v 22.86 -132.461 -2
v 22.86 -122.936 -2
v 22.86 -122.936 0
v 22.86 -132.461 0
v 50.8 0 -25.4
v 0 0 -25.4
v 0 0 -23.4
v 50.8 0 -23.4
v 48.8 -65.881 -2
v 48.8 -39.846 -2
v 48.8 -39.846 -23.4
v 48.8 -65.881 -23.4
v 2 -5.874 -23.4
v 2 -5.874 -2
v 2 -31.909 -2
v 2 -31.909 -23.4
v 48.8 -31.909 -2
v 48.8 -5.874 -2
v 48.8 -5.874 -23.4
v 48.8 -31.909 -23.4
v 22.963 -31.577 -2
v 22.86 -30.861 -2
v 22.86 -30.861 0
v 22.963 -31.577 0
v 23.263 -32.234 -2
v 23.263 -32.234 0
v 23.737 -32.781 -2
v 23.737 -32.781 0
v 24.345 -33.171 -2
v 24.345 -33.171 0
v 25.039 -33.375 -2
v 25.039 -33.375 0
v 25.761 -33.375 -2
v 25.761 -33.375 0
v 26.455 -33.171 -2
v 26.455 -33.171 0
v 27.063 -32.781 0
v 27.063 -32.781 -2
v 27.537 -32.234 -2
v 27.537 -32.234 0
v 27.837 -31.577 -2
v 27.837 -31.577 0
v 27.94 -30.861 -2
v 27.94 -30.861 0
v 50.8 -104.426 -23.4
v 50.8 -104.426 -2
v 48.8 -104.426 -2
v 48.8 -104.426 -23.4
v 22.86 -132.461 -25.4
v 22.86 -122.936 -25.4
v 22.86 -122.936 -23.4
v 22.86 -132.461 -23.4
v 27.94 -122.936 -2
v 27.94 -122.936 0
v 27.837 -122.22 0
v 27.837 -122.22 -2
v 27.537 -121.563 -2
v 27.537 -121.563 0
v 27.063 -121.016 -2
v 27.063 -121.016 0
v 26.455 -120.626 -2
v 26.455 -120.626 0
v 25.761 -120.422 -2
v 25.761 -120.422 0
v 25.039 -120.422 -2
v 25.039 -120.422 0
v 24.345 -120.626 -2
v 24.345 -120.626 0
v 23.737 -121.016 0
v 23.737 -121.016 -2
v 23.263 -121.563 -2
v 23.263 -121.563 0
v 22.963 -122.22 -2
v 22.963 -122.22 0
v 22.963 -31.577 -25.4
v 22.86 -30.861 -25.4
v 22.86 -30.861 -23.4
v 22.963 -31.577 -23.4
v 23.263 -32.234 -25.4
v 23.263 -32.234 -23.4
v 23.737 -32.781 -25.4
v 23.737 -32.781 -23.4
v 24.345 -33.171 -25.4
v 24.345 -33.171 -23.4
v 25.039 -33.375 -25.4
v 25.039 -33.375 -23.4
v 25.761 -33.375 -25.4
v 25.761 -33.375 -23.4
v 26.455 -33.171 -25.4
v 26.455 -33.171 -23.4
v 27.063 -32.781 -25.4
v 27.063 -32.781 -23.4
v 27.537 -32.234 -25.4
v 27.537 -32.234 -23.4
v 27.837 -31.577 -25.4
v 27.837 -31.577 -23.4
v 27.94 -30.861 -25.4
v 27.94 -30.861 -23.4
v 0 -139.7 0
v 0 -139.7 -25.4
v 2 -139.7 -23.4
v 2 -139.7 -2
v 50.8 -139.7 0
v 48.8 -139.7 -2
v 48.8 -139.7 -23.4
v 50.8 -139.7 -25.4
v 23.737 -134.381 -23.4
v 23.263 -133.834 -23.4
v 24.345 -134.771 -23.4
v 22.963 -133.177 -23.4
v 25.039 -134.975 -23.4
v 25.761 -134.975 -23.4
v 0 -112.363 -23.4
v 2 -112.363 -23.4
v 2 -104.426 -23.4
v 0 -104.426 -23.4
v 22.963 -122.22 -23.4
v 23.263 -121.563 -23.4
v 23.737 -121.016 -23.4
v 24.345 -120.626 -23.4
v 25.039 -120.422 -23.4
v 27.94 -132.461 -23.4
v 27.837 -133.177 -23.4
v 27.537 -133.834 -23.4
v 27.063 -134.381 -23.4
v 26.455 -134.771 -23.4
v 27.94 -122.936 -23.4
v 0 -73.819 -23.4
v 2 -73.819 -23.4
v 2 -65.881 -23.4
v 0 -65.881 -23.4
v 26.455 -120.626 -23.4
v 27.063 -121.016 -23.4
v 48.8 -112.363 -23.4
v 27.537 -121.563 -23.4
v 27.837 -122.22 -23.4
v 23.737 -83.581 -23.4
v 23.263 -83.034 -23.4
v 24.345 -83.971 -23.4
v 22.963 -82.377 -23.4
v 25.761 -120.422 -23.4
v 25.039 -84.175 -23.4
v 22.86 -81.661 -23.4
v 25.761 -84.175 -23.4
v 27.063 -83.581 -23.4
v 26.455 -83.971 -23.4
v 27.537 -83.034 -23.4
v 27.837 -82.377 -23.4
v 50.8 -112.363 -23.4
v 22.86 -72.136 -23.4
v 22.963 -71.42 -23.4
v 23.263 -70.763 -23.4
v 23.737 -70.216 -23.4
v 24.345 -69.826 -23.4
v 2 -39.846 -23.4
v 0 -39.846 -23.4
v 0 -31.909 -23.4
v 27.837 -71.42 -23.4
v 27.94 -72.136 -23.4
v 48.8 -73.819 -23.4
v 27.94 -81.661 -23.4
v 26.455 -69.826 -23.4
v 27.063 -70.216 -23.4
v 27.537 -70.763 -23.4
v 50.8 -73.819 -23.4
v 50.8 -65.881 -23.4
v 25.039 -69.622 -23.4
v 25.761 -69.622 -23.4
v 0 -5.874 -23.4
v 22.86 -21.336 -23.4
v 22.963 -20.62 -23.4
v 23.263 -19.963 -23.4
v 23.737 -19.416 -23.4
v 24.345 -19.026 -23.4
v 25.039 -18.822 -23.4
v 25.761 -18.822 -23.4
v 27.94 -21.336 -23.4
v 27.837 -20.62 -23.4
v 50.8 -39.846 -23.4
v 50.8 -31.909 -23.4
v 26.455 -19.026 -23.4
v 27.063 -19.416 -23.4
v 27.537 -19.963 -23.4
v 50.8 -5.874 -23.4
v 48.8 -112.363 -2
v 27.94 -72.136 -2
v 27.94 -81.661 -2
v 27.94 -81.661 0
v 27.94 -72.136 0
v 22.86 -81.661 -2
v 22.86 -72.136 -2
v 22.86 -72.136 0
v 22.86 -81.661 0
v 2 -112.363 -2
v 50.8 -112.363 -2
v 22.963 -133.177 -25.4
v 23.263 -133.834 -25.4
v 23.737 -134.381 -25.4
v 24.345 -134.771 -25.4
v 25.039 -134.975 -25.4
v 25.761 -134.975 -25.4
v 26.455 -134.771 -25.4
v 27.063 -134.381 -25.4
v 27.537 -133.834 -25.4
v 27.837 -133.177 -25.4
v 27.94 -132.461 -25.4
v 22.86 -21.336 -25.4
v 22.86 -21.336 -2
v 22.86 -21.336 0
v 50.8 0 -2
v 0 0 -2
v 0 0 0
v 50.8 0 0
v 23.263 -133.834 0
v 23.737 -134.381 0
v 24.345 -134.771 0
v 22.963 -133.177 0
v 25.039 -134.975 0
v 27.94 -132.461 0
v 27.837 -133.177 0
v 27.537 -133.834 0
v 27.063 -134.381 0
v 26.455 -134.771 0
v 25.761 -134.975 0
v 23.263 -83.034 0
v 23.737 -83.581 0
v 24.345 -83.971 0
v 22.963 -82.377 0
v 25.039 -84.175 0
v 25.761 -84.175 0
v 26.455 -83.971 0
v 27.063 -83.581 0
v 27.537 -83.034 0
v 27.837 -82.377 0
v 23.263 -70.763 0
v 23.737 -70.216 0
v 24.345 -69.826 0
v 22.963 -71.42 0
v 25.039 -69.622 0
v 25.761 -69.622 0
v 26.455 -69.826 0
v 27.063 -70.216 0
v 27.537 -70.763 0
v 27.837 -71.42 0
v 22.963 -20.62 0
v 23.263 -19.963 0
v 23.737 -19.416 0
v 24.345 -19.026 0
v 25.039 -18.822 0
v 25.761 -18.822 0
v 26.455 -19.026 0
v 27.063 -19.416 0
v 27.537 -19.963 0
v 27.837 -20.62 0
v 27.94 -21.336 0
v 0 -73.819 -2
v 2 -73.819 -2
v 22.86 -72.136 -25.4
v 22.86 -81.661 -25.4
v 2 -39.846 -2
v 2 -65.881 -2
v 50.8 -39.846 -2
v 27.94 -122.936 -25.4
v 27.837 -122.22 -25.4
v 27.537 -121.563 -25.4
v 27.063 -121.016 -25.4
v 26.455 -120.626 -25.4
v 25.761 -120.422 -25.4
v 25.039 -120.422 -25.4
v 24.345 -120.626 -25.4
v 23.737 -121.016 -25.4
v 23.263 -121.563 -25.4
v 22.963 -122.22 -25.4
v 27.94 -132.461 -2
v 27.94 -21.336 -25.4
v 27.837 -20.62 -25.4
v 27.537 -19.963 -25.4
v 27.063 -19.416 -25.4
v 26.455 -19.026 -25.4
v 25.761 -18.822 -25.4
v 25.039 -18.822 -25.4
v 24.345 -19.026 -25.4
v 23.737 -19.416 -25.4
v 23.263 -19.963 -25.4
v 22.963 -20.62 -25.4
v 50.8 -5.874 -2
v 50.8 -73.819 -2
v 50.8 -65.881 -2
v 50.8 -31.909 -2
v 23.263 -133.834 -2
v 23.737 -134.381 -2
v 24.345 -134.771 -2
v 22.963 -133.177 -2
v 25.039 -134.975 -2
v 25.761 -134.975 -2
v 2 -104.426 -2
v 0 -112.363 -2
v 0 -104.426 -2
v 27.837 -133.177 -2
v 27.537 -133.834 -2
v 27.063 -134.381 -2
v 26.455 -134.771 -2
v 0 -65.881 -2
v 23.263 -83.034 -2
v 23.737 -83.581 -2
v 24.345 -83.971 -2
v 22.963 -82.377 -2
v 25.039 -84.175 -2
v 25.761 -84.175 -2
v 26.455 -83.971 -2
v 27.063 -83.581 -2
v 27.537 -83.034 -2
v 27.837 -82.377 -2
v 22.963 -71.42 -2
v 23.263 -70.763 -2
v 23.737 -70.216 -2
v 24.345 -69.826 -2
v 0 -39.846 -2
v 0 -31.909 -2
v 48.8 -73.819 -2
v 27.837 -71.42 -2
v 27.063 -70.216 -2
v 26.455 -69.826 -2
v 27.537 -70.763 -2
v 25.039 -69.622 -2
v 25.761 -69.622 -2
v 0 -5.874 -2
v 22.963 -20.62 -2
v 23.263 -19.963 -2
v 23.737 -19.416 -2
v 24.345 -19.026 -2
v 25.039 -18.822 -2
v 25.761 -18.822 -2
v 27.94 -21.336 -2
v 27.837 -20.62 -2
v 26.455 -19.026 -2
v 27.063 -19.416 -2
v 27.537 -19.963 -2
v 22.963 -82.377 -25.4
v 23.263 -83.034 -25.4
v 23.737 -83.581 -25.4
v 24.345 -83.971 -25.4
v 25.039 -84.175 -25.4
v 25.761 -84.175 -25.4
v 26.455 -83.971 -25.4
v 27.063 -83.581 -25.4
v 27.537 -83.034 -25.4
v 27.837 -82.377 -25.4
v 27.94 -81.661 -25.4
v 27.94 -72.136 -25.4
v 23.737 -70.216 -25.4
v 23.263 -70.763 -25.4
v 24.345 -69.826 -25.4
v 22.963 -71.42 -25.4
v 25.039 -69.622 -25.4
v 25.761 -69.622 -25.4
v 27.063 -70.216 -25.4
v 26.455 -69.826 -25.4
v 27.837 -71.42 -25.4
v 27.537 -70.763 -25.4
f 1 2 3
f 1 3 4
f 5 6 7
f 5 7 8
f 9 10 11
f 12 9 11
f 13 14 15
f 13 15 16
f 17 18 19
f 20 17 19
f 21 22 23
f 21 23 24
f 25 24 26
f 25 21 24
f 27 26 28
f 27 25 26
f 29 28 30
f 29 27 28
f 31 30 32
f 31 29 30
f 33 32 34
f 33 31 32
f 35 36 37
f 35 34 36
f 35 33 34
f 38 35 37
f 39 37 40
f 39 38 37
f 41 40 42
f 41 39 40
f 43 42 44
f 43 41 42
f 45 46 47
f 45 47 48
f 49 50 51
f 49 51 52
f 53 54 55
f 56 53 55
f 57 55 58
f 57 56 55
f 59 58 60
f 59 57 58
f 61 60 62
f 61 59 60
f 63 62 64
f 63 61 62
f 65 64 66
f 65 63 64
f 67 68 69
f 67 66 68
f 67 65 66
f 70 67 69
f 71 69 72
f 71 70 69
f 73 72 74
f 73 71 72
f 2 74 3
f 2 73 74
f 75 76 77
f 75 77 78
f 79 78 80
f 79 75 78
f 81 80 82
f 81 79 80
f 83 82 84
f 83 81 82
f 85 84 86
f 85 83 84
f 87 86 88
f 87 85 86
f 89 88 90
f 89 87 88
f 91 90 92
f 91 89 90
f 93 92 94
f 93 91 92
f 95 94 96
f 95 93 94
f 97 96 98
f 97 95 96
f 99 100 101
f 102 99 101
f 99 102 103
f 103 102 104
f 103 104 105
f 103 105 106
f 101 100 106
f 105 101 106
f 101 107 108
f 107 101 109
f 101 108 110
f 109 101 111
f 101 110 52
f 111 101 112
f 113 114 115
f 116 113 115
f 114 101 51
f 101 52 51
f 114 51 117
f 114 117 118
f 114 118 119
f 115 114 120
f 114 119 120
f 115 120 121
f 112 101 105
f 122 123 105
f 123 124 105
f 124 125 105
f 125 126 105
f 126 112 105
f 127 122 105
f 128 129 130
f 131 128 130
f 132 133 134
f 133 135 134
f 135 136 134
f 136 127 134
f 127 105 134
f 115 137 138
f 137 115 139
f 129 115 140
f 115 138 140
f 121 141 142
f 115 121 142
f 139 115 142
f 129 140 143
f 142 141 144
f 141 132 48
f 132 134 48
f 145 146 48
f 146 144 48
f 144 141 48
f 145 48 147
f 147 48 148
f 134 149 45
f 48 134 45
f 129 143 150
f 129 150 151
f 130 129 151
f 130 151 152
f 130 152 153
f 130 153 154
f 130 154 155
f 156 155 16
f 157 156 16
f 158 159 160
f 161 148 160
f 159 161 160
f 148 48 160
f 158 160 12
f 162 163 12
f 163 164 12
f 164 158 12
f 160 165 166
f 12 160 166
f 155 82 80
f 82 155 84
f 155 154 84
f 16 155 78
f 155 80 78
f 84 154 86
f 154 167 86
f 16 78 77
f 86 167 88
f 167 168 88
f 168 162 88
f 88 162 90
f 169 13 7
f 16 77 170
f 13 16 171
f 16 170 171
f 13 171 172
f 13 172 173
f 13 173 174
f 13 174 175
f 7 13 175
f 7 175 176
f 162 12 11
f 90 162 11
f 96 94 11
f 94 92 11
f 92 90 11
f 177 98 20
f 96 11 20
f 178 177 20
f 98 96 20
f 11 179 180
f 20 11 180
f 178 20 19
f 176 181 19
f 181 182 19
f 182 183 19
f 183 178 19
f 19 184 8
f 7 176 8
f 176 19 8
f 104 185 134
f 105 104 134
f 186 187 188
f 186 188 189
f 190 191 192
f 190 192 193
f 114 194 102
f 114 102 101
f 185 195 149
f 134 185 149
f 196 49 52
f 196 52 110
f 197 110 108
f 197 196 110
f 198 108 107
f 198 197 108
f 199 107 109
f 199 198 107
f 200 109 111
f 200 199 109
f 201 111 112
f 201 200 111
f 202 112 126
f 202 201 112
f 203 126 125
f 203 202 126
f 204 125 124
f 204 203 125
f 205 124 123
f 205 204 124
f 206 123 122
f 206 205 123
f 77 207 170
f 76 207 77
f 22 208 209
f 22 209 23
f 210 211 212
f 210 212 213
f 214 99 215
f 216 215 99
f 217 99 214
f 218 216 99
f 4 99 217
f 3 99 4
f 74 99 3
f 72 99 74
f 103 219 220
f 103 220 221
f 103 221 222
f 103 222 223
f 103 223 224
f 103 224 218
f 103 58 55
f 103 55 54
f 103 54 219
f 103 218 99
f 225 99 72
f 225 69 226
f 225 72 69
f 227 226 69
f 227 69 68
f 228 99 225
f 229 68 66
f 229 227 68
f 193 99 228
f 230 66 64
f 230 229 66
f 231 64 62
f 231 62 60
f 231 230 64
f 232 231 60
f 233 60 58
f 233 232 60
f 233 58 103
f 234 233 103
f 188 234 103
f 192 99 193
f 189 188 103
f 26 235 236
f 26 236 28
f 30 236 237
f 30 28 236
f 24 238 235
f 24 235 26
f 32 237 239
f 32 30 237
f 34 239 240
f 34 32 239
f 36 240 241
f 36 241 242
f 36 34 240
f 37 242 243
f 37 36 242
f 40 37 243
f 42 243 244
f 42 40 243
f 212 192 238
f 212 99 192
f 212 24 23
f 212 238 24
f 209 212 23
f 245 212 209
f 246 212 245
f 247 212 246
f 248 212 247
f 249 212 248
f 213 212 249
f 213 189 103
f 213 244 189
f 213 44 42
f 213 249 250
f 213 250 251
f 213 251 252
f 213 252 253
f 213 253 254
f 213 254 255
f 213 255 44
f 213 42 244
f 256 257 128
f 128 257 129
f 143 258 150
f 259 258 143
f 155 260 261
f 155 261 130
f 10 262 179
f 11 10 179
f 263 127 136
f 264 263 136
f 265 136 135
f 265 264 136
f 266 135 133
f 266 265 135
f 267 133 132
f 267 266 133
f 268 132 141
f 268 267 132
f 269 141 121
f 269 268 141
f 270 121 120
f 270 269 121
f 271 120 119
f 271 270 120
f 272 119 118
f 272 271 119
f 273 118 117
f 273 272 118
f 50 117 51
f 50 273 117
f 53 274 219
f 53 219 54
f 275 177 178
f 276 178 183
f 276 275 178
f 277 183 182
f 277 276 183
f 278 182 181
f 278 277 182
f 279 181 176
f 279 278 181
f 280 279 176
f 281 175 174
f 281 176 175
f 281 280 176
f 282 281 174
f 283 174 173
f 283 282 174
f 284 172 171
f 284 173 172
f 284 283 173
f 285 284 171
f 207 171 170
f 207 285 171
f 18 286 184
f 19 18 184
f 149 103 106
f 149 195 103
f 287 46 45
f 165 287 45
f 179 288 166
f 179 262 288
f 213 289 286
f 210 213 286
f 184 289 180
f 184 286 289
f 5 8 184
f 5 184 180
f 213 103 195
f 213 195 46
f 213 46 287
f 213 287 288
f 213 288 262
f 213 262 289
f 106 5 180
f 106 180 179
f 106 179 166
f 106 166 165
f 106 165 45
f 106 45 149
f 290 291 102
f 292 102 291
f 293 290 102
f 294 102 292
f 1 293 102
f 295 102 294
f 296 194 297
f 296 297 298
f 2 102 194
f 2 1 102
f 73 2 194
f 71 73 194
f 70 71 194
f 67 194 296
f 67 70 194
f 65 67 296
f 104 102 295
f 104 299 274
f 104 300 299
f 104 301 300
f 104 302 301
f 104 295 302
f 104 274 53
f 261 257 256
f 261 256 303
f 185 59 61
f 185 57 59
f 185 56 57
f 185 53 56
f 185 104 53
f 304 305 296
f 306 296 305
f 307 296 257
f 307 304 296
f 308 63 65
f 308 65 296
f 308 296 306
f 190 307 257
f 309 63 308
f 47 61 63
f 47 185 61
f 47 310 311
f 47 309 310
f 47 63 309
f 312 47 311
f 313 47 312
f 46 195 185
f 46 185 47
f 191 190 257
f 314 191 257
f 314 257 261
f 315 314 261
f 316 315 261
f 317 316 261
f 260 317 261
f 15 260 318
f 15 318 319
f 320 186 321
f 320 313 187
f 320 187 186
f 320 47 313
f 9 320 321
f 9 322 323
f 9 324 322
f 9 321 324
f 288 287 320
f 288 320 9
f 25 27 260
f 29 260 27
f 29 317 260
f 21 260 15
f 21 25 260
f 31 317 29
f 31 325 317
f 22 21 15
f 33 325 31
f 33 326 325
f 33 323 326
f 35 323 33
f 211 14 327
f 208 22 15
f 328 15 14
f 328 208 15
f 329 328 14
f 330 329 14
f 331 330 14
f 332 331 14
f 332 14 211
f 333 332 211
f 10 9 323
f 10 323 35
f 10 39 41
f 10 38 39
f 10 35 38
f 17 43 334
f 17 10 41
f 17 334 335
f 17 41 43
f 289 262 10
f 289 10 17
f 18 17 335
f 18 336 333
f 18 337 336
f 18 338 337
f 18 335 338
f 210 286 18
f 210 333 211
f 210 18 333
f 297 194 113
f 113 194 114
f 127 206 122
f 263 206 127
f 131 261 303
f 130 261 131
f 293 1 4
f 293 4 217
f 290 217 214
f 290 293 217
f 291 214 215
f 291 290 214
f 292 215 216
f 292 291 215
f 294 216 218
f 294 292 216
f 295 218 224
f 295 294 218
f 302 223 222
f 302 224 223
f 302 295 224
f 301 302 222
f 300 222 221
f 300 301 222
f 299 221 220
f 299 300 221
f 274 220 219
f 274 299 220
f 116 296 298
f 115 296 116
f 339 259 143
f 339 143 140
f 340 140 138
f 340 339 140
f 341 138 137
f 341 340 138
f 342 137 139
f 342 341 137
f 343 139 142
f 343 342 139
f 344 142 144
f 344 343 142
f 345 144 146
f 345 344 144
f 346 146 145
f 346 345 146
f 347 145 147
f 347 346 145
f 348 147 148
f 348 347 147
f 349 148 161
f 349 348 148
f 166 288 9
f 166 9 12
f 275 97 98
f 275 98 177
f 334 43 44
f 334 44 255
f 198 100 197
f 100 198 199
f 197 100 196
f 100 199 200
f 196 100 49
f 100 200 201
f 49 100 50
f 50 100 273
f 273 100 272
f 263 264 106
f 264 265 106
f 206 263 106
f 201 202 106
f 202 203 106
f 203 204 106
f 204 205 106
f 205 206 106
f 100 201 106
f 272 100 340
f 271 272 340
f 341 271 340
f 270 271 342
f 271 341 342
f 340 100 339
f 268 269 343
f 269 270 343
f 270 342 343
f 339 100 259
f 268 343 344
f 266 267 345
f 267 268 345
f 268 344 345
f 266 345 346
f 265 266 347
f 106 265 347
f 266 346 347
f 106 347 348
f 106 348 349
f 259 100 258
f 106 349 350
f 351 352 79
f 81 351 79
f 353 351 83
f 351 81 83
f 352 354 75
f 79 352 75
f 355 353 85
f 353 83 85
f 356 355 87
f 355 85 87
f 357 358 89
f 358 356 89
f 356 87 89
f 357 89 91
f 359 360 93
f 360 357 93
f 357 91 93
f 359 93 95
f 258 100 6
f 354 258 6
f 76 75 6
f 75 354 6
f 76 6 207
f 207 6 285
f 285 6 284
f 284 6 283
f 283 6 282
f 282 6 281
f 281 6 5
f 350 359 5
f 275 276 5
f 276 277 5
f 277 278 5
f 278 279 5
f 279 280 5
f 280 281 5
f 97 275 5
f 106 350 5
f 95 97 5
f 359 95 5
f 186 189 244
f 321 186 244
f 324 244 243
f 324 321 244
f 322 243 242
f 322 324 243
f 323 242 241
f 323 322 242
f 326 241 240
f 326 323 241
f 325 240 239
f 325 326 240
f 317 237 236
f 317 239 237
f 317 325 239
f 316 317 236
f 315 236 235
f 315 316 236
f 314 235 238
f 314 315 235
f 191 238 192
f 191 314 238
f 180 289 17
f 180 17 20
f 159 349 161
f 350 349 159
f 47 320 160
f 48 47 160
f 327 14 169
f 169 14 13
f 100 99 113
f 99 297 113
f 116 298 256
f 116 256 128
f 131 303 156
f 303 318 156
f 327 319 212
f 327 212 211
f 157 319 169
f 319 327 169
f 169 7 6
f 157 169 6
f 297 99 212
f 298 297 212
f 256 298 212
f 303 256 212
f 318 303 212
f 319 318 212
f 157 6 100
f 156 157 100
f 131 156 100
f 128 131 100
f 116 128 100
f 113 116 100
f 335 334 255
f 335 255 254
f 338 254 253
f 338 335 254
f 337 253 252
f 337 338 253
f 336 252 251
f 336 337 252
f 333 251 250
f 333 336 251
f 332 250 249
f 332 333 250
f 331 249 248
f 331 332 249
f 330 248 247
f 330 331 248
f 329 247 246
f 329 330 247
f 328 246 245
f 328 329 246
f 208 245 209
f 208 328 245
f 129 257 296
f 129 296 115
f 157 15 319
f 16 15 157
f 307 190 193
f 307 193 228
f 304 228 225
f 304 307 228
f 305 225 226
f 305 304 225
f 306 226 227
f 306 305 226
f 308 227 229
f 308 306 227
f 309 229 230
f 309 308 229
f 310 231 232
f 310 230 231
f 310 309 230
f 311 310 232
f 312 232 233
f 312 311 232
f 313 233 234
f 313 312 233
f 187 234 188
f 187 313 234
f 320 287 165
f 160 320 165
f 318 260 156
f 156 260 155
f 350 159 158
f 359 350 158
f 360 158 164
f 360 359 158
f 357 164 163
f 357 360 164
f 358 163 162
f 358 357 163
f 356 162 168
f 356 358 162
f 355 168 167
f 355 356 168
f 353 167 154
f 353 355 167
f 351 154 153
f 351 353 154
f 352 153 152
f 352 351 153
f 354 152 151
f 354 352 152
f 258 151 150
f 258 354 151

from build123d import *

# Parameters (mm, degrees)
SKETCH1_W           = 50.8
SKETCH1_H           = 25.4
SKETCH1_W_2         = 46.8
SKETCH1_H_2         = 21.4
BOSS_EXTRUDE1_DEPTH = 139.7
SKETCH2_W           = 21.4
SKETCH2_H           = 7.9375
CUT_EXTRUDE1_DEPTH  = 151.804144505
LPATTERN1_COUNT     = 3
LPATTERN1_PITCH     = 33.9725
LPATTERN1_COL_COUNT = 2
LPATTERN1_COL_PITCH = 38.5445
CUT_EXTRUDE2_DEPTH  = 151.804144505
LPATTERN2_COUNT     = 3
LPATTERN2_PITCH     = 50.8


with BuildPart() as part:
    # Sketch1 → Boss-Extrude1 (new body)
    with BuildSketch(Plane(origin=(0, 0, 0), x_dir=(1, 0, 0), z_dir=(0, 1, 0))):
        with Locations((25.4, 12.7)):
            Rectangle(SKETCH1_W, SKETCH1_H)
        with Locations((25.4, 12.7)):
            Rectangle(SKETCH1_W_2, SKETCH1_H_2, mode=Mode.SUBTRACT)
    extrude(amount=-BOSS_EXTRUDE1_DEPTH)

    # Sketch2 → Cut-Extrude1 (cut, through all)
    with BuildSketch(Plane(origin=(50.8, 0, 0), x_dir=(0, 0, -1), z_dir=(1, 0, 0))):
        with Locations((12.7, -69.85)):
            Rectangle(SKETCH2_W, SKETCH2_H)
    cut_extrude1 = extrude(amount=-CUT_EXTRUDE1_DEPTH, mode=Mode.SUBTRACT)

    # LPattern1: Cut-Extrude1 ×3
    with Locations(*[(0, i * LPATTERN1_PITCH, 0) for i in range(1, LPATTERN1_COUNT)]):
        add(cut_extrude1, mode=Mode.SUBTRACT)

    # LPattern1 col: Cut-Extrude1 ×2
    with Locations(*[(0, -i * LPATTERN1_COL_PITCH, 0) for i in range(1, LPATTERN1_COL_COUNT)]):
        add(cut_extrude1, mode=Mode.SUBTRACT)

    # Sketch3 → Cut-Extrude2 (cut, through all)
    with BuildSketch(Plane(origin=(0, 0, -25.4), x_dir=(-1, 0, 0), z_dir=(0, 0, -1))):
        with BuildLine():
            Line((-22.86, -21.336), (-22.86, -30.861))
            ThreePointArc((-22.86, -30.861), (-25.4, -33.401), (-27.94, -30.861))
            Line((-27.94, -30.861), (-27.94, -21.336))
            ThreePointArc((-27.94, -21.336), (-25.4, -18.796), (-22.86, -21.336))
        make_face()
    cut_extrude2 = extrude(amount=-CUT_EXTRUDE2_DEPTH, mode=Mode.SUBTRACT)

    # LPattern2: Cut-Extrude2 ×3
    with Locations(*[(0, -i * LPATTERN2_PITCH, 0) for i in range(1, LPATTERN2_COUNT)]):
        add(cut_extrude2, mode=Mode.SUBTRACT)


solid = part.part
